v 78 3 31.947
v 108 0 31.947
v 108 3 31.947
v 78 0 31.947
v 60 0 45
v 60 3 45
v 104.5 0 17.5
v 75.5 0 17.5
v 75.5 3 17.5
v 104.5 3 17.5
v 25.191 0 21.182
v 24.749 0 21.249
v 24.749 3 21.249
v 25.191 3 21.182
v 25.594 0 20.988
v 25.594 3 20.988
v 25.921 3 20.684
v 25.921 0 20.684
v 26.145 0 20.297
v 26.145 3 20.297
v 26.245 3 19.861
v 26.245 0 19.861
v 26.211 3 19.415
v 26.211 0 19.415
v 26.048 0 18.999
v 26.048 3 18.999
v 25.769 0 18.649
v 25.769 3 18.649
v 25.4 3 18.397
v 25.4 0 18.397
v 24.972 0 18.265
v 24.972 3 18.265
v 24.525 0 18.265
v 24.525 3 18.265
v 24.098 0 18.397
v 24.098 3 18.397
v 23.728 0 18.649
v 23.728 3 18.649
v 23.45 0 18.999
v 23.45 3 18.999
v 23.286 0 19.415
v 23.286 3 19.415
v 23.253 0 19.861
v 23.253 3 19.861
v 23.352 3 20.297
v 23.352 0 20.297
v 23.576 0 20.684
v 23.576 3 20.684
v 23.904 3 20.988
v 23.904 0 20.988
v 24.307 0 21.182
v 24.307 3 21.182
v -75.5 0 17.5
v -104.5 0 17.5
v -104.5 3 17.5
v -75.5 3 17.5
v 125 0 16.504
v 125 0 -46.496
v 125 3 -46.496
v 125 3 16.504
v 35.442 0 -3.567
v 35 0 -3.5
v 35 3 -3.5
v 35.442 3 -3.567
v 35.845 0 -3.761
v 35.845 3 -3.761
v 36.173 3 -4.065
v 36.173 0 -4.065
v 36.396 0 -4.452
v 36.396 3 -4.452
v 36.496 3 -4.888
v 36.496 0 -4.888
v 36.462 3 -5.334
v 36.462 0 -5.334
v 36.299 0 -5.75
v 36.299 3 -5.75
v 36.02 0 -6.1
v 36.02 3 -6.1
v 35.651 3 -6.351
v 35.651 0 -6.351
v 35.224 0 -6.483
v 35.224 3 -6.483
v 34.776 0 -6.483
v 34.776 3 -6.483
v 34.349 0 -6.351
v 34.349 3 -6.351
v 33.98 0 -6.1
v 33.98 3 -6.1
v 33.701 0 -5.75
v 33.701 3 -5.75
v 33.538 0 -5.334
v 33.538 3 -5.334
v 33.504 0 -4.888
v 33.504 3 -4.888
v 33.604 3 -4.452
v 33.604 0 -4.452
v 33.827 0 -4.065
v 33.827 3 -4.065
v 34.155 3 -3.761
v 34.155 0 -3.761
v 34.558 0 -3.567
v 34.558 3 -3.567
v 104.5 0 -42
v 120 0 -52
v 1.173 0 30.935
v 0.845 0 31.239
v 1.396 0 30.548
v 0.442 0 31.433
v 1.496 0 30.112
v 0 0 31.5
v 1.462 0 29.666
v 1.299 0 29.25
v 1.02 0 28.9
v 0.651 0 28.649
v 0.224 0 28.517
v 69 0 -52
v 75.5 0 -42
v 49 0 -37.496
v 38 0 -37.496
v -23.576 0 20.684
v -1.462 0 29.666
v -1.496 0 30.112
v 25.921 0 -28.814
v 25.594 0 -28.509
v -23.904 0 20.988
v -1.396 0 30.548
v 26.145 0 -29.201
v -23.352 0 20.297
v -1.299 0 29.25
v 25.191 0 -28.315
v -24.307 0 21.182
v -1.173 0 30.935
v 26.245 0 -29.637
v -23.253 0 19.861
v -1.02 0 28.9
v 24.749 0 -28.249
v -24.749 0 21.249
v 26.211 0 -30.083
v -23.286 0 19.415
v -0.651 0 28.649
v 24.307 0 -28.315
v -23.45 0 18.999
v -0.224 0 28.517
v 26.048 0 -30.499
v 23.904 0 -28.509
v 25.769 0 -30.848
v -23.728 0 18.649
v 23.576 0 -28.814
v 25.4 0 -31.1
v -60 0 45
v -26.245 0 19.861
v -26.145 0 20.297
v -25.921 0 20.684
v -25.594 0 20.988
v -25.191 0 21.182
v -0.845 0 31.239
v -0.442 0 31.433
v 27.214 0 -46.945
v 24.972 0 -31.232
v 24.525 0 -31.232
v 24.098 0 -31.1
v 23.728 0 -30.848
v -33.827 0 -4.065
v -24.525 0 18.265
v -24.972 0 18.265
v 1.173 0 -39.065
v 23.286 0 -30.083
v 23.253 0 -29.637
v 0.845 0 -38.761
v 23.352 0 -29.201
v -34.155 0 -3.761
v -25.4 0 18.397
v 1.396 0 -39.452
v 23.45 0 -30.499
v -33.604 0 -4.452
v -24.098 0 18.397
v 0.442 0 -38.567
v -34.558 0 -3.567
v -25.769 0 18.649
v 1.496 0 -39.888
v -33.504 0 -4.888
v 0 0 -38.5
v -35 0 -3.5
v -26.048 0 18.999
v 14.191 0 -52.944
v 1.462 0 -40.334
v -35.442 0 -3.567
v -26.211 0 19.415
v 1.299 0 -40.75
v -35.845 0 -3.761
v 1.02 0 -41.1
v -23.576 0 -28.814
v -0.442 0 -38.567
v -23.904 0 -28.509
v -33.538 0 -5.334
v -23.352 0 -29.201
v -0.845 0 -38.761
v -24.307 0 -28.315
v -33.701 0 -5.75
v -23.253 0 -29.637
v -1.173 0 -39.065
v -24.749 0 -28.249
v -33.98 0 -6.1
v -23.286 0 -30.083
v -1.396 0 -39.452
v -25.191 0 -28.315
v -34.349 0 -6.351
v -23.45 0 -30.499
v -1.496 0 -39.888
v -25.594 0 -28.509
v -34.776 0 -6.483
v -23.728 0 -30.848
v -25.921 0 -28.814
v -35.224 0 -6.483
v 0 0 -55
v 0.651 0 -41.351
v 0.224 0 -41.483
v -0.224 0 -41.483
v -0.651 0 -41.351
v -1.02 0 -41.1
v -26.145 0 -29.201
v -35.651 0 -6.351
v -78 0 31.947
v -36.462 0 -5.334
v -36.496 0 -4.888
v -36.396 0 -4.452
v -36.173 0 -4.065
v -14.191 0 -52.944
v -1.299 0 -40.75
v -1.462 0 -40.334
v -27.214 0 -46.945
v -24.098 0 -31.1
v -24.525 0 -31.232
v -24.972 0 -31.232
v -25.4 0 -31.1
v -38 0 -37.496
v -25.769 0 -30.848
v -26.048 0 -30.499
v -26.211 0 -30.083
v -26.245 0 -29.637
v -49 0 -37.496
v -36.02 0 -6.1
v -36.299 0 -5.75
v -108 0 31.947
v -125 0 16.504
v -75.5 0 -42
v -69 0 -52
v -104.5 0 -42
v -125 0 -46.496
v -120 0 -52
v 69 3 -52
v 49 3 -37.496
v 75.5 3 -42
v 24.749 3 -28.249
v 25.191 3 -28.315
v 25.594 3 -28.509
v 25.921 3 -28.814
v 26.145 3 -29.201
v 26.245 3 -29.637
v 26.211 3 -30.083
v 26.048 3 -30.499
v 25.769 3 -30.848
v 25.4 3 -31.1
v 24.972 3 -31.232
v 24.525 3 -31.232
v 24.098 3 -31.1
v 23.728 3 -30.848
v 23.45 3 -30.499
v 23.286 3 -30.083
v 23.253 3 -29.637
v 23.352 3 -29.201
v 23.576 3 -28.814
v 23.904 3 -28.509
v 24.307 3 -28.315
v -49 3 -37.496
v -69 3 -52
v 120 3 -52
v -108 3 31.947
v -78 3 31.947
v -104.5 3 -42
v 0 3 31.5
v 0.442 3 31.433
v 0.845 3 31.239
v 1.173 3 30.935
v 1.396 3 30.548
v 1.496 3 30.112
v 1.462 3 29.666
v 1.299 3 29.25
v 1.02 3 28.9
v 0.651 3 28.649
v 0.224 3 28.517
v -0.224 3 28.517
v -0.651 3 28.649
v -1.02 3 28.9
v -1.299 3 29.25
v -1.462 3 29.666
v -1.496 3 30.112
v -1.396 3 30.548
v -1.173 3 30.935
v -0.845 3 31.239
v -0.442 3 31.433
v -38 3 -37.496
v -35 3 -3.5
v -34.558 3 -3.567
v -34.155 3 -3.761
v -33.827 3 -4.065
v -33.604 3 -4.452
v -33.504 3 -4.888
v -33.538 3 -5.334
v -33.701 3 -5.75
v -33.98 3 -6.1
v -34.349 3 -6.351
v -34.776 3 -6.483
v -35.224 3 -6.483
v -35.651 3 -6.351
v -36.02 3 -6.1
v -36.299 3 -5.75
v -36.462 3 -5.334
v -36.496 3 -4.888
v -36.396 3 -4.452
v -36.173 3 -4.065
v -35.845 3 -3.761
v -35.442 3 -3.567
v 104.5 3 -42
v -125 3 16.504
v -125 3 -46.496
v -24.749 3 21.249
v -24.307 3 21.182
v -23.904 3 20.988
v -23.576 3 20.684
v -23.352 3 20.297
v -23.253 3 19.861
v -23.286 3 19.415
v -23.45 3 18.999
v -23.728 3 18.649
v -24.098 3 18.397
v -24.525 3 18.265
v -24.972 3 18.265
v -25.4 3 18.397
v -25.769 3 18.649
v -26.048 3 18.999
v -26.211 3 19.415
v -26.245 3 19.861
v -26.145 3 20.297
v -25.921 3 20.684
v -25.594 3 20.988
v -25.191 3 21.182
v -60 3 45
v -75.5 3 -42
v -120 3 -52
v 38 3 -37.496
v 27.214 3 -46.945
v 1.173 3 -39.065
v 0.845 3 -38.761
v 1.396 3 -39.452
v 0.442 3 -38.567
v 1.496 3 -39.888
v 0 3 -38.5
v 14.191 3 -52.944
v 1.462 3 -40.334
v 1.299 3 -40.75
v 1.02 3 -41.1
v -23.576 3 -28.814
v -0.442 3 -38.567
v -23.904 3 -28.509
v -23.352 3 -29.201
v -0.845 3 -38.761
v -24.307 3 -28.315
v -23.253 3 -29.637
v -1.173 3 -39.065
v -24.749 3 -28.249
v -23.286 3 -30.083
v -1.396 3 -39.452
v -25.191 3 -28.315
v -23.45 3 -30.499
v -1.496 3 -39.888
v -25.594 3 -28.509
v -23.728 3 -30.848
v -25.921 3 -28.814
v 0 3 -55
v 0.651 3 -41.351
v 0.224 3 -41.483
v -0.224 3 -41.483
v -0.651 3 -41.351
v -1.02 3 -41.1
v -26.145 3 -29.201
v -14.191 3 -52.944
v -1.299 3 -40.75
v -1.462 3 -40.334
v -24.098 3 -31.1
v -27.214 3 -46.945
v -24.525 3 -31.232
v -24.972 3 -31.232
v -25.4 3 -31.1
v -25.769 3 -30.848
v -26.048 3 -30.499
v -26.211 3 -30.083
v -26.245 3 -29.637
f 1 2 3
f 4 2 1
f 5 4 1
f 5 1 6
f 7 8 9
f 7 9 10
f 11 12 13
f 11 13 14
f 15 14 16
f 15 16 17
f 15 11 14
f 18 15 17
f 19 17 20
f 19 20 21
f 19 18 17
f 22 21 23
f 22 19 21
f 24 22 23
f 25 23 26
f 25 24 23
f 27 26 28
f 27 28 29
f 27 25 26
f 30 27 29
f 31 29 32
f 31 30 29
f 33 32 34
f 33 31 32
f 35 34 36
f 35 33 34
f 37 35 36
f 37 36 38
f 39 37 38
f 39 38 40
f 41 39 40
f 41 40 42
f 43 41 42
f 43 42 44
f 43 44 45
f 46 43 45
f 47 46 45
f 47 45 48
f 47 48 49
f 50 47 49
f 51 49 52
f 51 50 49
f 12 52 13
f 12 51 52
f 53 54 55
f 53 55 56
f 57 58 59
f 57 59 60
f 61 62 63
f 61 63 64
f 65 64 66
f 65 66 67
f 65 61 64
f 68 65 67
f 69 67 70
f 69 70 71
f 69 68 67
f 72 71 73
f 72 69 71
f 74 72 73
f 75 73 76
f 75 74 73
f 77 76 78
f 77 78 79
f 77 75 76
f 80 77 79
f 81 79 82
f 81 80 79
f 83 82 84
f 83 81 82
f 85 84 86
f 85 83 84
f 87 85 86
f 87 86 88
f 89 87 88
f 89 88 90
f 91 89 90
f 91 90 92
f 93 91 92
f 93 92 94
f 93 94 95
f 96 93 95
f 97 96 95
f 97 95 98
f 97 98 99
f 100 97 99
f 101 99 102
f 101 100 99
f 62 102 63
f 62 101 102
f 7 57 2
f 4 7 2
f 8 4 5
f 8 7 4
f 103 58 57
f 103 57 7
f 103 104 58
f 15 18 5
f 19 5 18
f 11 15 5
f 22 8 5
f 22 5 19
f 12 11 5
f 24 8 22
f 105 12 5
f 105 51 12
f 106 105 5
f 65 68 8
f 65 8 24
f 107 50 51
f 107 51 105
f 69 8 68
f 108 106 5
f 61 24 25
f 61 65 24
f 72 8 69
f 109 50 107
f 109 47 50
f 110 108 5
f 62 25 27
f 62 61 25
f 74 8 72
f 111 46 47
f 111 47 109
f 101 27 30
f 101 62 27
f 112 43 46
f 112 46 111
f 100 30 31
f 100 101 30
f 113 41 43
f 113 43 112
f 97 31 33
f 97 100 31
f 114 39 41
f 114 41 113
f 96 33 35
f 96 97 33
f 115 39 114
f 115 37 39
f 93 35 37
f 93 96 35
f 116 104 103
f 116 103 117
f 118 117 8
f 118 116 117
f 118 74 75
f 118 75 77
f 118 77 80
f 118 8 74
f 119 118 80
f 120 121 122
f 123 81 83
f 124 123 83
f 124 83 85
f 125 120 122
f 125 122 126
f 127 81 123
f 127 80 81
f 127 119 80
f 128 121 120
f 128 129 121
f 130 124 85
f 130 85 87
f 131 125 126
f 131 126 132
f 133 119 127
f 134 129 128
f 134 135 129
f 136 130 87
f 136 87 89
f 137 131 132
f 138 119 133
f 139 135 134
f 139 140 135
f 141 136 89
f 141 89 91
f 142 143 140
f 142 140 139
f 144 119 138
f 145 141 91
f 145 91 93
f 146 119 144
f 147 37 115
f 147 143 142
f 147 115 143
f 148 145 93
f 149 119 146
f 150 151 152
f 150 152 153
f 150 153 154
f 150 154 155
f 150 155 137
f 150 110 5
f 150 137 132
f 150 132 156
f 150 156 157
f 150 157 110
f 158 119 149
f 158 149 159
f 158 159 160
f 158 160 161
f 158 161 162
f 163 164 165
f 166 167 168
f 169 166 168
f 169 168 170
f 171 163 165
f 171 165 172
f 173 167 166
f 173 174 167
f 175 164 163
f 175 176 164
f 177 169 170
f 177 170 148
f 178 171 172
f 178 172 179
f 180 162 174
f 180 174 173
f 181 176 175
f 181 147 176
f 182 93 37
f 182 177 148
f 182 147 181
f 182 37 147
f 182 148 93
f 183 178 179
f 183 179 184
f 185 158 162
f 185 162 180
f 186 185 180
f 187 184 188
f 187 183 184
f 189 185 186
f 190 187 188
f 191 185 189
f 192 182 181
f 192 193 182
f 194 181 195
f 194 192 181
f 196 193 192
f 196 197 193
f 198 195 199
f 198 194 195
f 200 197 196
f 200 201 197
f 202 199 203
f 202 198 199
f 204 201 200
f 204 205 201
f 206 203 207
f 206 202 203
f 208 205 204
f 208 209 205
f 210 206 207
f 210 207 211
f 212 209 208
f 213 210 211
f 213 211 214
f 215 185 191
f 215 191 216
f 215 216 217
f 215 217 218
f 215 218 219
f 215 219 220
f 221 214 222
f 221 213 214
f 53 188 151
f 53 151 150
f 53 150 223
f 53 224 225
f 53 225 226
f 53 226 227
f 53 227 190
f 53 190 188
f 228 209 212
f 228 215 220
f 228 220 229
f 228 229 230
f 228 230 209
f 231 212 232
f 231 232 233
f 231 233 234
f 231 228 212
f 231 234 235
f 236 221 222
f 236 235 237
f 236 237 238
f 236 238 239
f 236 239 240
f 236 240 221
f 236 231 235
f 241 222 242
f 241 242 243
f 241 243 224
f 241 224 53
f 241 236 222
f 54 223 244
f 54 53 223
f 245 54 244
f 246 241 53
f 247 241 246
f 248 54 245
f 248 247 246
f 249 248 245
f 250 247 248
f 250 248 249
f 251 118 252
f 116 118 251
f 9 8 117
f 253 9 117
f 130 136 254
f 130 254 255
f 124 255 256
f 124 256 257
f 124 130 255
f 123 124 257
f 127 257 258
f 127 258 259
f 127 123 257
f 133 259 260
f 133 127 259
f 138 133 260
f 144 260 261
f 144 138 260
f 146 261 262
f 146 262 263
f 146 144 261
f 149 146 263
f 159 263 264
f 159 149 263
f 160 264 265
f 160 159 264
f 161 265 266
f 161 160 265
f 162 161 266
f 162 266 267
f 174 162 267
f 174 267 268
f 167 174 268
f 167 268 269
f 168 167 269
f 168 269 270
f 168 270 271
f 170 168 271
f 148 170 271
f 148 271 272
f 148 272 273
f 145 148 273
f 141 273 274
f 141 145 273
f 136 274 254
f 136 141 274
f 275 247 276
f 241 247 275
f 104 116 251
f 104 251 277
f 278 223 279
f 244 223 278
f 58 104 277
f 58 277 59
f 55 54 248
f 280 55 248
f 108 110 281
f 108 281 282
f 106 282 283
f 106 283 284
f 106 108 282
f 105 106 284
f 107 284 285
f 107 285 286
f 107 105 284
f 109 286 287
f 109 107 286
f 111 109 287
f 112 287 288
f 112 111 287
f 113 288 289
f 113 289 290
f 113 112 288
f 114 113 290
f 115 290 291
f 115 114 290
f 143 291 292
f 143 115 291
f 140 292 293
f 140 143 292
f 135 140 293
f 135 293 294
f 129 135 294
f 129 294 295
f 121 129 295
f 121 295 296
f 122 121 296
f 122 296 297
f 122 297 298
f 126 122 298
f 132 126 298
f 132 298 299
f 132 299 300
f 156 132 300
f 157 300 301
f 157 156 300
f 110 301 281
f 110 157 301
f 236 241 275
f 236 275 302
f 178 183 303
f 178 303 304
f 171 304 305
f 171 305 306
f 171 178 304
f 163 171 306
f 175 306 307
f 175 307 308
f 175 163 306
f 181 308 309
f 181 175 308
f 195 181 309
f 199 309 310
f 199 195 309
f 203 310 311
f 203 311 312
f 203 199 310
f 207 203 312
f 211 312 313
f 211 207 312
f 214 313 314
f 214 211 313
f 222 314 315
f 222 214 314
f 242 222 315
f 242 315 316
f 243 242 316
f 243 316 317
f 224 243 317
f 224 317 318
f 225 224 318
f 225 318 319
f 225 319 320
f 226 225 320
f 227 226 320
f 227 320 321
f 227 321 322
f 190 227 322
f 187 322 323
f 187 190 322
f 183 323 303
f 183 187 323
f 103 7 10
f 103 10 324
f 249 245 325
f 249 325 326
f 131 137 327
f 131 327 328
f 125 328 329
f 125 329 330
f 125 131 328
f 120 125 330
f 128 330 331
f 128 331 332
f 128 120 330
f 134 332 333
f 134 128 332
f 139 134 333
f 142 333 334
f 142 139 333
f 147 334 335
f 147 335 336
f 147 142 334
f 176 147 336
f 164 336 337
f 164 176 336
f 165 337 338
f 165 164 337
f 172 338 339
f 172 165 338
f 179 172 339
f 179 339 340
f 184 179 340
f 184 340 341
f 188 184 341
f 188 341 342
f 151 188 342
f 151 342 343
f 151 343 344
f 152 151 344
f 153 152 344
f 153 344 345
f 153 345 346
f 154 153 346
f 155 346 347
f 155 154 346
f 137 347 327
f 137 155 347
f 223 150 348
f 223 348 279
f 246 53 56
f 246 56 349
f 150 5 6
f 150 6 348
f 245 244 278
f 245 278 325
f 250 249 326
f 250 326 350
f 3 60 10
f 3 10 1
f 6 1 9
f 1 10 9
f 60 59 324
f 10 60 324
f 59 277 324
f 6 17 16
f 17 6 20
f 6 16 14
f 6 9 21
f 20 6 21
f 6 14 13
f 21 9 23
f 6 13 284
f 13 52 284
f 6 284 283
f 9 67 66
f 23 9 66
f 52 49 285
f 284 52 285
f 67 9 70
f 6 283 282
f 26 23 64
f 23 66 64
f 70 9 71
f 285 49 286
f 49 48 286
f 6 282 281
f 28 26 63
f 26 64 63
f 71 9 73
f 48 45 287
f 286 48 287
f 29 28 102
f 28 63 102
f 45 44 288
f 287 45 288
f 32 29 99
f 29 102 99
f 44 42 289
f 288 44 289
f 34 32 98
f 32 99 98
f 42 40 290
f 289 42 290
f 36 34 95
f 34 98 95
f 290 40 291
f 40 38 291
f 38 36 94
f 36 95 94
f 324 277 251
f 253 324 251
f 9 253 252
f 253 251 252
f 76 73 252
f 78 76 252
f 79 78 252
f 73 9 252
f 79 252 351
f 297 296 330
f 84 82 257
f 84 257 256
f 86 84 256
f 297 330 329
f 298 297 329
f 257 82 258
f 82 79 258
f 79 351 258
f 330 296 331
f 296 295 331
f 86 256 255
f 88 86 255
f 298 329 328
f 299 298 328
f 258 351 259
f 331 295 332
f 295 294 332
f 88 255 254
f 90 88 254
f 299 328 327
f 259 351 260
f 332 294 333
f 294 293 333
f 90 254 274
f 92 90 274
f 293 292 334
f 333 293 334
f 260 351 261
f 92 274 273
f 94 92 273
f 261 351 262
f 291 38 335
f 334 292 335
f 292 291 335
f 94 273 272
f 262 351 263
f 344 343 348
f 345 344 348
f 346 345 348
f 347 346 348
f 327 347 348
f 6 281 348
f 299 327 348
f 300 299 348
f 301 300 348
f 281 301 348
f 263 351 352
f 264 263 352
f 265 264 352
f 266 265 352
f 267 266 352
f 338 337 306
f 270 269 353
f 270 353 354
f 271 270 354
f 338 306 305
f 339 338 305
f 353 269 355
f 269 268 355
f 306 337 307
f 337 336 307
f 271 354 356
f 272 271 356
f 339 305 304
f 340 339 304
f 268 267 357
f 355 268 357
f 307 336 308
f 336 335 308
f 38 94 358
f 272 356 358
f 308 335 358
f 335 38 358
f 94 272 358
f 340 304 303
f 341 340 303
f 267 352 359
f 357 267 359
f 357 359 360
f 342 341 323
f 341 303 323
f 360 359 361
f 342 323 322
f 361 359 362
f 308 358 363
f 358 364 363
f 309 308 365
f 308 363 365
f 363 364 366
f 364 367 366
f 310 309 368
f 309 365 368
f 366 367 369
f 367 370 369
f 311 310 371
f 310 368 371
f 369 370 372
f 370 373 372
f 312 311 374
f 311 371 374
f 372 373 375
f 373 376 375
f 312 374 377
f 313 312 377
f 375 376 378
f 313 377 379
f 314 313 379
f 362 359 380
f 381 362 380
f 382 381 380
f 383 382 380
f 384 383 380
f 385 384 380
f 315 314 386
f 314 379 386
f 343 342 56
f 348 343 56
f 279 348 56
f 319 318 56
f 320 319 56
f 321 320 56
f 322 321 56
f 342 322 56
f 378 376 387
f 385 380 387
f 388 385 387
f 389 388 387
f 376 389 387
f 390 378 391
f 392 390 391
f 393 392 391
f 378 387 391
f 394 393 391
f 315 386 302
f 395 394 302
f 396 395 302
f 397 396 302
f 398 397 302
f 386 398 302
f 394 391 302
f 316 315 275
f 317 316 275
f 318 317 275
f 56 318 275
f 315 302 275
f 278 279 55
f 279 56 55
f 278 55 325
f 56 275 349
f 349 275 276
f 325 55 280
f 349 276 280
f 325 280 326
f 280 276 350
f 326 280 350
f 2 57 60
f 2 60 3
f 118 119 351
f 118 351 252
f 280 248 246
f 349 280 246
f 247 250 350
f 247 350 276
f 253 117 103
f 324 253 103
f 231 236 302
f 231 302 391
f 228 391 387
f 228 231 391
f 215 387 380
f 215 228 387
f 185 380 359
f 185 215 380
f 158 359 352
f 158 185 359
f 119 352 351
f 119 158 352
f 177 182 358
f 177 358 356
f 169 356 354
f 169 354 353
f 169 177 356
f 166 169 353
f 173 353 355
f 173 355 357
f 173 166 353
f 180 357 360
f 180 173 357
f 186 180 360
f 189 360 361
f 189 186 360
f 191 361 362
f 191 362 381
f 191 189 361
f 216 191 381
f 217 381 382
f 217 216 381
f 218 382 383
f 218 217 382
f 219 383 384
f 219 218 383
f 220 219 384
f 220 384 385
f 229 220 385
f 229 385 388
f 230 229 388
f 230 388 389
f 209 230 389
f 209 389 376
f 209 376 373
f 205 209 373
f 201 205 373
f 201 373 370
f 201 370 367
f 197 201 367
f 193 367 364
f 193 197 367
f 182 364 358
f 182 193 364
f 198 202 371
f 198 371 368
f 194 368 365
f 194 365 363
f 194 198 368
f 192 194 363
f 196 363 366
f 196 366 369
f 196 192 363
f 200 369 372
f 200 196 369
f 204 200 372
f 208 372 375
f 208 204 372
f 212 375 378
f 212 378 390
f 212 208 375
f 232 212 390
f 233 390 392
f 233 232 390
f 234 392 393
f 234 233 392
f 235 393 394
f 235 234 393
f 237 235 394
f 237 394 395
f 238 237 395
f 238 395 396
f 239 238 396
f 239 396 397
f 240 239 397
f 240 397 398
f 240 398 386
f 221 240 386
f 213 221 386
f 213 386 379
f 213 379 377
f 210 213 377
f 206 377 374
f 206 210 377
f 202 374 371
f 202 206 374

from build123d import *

# Parameters (mm, degrees)
SKETCH1_R           = 1.5
SKETCH1_W           = 29
SKETCH1_H           = 59.5
BOSS_EXTRUDE1_DEPTH = 3


with BuildPart() as part:
    # Sketch1 → Boss-Extrude1 (new body)
    with BuildSketch(Plane(origin=(0, 0, 0), x_dir=(1, 0, 0), z_dir=(0, 1, 0))):
        with BuildLine():
            Line((125, 46.495570398), (125, -16.504429602))
            Line((125, -16.504429602), (108, -31.946538257))
            Line((108, -31.946538257), (78, -31.946538257))
            Line((78, -31.946538257), (60, -45))
            Line((60, -45), (-60, -45))
            Line((-60, -45), (-78, -31.946538257))
            Line((-78, -31.946538257), (-108, -31.946538257))
            Line((-108, -31.946538257), (-125, -16.504429602))
            Line((-125, -16.504429602), (-125, 46.495570398))
            Line((-125, 46.495570398), (-120, 52))
            Line((-120, 52), (-69, 52))
            Line((-69, 52), (-49, 37.496153619))
            Line((-49, 37.496153619), (-38, 37.496153619))
            ThreePointArc((-38, 37.496153619), (0, 55), (38, 37.496153619))
            Line((38, 37.496153619), (49, 37.496153619))
            Line((49, 37.496153619), (69, 52))
            Line((69, 52), (120, 52))
            Line((120, 52), (125, 46.495570398))
        make_face()
        with Locations(Location((-35, 5, 0), (0, 0, 270))):
            Circle(SKETCH1_R, mode=Mode.SUBTRACT)
        with Locations(Location((-24.748737342, -19.748737342, 0), (0, 0, 270))):
            Circle(SKETCH1_R, mode=Mode.SUBTRACT)
        with Locations(Location((0, -30, 0), (0, 0, 270))):
            Circle(SKETCH1_R, mode=Mode.SUBTRACT)
        with Locations(Location((24.748737342, -19.748737342, 0), (0, 0, 270))):
            Circle(SKETCH1_R, mode=Mode.SUBTRACT)
        with Locations(Location((35, 5, 0), (0, 0, 270))):
            Circle(SKETCH1_R, mode=Mode.SUBTRACT)
        with Locations(Location((24.748737342, 29.748737342, 0), (0, 0, 270))):
            Circle(SKETCH1_R, mode=Mode.SUBTRACT)
        with Locations(Location((0, 40, 0), (0, 0, 270))):
            Circle(SKETCH1_R, mode=Mode.SUBTRACT)
        with Locations(Location((-24.748737342, 29.748737342, 0), (0, 0, 270))):
            Circle(SKETCH1_R, mode=Mode.SUBTRACT)
        with Locations((-90, 12.25)):
            Rectangle(SKETCH1_W, SKETCH1_H, mode=Mode.SUBTRACT)
        with Locations((90, 12.25)):
            Rectangle(SKETCH1_W, SKETCH1_H, mode=Mode.SUBTRACT)
    extrude(amount=BOSS_EXTRUDE1_DEPTH)


solid = part.part
